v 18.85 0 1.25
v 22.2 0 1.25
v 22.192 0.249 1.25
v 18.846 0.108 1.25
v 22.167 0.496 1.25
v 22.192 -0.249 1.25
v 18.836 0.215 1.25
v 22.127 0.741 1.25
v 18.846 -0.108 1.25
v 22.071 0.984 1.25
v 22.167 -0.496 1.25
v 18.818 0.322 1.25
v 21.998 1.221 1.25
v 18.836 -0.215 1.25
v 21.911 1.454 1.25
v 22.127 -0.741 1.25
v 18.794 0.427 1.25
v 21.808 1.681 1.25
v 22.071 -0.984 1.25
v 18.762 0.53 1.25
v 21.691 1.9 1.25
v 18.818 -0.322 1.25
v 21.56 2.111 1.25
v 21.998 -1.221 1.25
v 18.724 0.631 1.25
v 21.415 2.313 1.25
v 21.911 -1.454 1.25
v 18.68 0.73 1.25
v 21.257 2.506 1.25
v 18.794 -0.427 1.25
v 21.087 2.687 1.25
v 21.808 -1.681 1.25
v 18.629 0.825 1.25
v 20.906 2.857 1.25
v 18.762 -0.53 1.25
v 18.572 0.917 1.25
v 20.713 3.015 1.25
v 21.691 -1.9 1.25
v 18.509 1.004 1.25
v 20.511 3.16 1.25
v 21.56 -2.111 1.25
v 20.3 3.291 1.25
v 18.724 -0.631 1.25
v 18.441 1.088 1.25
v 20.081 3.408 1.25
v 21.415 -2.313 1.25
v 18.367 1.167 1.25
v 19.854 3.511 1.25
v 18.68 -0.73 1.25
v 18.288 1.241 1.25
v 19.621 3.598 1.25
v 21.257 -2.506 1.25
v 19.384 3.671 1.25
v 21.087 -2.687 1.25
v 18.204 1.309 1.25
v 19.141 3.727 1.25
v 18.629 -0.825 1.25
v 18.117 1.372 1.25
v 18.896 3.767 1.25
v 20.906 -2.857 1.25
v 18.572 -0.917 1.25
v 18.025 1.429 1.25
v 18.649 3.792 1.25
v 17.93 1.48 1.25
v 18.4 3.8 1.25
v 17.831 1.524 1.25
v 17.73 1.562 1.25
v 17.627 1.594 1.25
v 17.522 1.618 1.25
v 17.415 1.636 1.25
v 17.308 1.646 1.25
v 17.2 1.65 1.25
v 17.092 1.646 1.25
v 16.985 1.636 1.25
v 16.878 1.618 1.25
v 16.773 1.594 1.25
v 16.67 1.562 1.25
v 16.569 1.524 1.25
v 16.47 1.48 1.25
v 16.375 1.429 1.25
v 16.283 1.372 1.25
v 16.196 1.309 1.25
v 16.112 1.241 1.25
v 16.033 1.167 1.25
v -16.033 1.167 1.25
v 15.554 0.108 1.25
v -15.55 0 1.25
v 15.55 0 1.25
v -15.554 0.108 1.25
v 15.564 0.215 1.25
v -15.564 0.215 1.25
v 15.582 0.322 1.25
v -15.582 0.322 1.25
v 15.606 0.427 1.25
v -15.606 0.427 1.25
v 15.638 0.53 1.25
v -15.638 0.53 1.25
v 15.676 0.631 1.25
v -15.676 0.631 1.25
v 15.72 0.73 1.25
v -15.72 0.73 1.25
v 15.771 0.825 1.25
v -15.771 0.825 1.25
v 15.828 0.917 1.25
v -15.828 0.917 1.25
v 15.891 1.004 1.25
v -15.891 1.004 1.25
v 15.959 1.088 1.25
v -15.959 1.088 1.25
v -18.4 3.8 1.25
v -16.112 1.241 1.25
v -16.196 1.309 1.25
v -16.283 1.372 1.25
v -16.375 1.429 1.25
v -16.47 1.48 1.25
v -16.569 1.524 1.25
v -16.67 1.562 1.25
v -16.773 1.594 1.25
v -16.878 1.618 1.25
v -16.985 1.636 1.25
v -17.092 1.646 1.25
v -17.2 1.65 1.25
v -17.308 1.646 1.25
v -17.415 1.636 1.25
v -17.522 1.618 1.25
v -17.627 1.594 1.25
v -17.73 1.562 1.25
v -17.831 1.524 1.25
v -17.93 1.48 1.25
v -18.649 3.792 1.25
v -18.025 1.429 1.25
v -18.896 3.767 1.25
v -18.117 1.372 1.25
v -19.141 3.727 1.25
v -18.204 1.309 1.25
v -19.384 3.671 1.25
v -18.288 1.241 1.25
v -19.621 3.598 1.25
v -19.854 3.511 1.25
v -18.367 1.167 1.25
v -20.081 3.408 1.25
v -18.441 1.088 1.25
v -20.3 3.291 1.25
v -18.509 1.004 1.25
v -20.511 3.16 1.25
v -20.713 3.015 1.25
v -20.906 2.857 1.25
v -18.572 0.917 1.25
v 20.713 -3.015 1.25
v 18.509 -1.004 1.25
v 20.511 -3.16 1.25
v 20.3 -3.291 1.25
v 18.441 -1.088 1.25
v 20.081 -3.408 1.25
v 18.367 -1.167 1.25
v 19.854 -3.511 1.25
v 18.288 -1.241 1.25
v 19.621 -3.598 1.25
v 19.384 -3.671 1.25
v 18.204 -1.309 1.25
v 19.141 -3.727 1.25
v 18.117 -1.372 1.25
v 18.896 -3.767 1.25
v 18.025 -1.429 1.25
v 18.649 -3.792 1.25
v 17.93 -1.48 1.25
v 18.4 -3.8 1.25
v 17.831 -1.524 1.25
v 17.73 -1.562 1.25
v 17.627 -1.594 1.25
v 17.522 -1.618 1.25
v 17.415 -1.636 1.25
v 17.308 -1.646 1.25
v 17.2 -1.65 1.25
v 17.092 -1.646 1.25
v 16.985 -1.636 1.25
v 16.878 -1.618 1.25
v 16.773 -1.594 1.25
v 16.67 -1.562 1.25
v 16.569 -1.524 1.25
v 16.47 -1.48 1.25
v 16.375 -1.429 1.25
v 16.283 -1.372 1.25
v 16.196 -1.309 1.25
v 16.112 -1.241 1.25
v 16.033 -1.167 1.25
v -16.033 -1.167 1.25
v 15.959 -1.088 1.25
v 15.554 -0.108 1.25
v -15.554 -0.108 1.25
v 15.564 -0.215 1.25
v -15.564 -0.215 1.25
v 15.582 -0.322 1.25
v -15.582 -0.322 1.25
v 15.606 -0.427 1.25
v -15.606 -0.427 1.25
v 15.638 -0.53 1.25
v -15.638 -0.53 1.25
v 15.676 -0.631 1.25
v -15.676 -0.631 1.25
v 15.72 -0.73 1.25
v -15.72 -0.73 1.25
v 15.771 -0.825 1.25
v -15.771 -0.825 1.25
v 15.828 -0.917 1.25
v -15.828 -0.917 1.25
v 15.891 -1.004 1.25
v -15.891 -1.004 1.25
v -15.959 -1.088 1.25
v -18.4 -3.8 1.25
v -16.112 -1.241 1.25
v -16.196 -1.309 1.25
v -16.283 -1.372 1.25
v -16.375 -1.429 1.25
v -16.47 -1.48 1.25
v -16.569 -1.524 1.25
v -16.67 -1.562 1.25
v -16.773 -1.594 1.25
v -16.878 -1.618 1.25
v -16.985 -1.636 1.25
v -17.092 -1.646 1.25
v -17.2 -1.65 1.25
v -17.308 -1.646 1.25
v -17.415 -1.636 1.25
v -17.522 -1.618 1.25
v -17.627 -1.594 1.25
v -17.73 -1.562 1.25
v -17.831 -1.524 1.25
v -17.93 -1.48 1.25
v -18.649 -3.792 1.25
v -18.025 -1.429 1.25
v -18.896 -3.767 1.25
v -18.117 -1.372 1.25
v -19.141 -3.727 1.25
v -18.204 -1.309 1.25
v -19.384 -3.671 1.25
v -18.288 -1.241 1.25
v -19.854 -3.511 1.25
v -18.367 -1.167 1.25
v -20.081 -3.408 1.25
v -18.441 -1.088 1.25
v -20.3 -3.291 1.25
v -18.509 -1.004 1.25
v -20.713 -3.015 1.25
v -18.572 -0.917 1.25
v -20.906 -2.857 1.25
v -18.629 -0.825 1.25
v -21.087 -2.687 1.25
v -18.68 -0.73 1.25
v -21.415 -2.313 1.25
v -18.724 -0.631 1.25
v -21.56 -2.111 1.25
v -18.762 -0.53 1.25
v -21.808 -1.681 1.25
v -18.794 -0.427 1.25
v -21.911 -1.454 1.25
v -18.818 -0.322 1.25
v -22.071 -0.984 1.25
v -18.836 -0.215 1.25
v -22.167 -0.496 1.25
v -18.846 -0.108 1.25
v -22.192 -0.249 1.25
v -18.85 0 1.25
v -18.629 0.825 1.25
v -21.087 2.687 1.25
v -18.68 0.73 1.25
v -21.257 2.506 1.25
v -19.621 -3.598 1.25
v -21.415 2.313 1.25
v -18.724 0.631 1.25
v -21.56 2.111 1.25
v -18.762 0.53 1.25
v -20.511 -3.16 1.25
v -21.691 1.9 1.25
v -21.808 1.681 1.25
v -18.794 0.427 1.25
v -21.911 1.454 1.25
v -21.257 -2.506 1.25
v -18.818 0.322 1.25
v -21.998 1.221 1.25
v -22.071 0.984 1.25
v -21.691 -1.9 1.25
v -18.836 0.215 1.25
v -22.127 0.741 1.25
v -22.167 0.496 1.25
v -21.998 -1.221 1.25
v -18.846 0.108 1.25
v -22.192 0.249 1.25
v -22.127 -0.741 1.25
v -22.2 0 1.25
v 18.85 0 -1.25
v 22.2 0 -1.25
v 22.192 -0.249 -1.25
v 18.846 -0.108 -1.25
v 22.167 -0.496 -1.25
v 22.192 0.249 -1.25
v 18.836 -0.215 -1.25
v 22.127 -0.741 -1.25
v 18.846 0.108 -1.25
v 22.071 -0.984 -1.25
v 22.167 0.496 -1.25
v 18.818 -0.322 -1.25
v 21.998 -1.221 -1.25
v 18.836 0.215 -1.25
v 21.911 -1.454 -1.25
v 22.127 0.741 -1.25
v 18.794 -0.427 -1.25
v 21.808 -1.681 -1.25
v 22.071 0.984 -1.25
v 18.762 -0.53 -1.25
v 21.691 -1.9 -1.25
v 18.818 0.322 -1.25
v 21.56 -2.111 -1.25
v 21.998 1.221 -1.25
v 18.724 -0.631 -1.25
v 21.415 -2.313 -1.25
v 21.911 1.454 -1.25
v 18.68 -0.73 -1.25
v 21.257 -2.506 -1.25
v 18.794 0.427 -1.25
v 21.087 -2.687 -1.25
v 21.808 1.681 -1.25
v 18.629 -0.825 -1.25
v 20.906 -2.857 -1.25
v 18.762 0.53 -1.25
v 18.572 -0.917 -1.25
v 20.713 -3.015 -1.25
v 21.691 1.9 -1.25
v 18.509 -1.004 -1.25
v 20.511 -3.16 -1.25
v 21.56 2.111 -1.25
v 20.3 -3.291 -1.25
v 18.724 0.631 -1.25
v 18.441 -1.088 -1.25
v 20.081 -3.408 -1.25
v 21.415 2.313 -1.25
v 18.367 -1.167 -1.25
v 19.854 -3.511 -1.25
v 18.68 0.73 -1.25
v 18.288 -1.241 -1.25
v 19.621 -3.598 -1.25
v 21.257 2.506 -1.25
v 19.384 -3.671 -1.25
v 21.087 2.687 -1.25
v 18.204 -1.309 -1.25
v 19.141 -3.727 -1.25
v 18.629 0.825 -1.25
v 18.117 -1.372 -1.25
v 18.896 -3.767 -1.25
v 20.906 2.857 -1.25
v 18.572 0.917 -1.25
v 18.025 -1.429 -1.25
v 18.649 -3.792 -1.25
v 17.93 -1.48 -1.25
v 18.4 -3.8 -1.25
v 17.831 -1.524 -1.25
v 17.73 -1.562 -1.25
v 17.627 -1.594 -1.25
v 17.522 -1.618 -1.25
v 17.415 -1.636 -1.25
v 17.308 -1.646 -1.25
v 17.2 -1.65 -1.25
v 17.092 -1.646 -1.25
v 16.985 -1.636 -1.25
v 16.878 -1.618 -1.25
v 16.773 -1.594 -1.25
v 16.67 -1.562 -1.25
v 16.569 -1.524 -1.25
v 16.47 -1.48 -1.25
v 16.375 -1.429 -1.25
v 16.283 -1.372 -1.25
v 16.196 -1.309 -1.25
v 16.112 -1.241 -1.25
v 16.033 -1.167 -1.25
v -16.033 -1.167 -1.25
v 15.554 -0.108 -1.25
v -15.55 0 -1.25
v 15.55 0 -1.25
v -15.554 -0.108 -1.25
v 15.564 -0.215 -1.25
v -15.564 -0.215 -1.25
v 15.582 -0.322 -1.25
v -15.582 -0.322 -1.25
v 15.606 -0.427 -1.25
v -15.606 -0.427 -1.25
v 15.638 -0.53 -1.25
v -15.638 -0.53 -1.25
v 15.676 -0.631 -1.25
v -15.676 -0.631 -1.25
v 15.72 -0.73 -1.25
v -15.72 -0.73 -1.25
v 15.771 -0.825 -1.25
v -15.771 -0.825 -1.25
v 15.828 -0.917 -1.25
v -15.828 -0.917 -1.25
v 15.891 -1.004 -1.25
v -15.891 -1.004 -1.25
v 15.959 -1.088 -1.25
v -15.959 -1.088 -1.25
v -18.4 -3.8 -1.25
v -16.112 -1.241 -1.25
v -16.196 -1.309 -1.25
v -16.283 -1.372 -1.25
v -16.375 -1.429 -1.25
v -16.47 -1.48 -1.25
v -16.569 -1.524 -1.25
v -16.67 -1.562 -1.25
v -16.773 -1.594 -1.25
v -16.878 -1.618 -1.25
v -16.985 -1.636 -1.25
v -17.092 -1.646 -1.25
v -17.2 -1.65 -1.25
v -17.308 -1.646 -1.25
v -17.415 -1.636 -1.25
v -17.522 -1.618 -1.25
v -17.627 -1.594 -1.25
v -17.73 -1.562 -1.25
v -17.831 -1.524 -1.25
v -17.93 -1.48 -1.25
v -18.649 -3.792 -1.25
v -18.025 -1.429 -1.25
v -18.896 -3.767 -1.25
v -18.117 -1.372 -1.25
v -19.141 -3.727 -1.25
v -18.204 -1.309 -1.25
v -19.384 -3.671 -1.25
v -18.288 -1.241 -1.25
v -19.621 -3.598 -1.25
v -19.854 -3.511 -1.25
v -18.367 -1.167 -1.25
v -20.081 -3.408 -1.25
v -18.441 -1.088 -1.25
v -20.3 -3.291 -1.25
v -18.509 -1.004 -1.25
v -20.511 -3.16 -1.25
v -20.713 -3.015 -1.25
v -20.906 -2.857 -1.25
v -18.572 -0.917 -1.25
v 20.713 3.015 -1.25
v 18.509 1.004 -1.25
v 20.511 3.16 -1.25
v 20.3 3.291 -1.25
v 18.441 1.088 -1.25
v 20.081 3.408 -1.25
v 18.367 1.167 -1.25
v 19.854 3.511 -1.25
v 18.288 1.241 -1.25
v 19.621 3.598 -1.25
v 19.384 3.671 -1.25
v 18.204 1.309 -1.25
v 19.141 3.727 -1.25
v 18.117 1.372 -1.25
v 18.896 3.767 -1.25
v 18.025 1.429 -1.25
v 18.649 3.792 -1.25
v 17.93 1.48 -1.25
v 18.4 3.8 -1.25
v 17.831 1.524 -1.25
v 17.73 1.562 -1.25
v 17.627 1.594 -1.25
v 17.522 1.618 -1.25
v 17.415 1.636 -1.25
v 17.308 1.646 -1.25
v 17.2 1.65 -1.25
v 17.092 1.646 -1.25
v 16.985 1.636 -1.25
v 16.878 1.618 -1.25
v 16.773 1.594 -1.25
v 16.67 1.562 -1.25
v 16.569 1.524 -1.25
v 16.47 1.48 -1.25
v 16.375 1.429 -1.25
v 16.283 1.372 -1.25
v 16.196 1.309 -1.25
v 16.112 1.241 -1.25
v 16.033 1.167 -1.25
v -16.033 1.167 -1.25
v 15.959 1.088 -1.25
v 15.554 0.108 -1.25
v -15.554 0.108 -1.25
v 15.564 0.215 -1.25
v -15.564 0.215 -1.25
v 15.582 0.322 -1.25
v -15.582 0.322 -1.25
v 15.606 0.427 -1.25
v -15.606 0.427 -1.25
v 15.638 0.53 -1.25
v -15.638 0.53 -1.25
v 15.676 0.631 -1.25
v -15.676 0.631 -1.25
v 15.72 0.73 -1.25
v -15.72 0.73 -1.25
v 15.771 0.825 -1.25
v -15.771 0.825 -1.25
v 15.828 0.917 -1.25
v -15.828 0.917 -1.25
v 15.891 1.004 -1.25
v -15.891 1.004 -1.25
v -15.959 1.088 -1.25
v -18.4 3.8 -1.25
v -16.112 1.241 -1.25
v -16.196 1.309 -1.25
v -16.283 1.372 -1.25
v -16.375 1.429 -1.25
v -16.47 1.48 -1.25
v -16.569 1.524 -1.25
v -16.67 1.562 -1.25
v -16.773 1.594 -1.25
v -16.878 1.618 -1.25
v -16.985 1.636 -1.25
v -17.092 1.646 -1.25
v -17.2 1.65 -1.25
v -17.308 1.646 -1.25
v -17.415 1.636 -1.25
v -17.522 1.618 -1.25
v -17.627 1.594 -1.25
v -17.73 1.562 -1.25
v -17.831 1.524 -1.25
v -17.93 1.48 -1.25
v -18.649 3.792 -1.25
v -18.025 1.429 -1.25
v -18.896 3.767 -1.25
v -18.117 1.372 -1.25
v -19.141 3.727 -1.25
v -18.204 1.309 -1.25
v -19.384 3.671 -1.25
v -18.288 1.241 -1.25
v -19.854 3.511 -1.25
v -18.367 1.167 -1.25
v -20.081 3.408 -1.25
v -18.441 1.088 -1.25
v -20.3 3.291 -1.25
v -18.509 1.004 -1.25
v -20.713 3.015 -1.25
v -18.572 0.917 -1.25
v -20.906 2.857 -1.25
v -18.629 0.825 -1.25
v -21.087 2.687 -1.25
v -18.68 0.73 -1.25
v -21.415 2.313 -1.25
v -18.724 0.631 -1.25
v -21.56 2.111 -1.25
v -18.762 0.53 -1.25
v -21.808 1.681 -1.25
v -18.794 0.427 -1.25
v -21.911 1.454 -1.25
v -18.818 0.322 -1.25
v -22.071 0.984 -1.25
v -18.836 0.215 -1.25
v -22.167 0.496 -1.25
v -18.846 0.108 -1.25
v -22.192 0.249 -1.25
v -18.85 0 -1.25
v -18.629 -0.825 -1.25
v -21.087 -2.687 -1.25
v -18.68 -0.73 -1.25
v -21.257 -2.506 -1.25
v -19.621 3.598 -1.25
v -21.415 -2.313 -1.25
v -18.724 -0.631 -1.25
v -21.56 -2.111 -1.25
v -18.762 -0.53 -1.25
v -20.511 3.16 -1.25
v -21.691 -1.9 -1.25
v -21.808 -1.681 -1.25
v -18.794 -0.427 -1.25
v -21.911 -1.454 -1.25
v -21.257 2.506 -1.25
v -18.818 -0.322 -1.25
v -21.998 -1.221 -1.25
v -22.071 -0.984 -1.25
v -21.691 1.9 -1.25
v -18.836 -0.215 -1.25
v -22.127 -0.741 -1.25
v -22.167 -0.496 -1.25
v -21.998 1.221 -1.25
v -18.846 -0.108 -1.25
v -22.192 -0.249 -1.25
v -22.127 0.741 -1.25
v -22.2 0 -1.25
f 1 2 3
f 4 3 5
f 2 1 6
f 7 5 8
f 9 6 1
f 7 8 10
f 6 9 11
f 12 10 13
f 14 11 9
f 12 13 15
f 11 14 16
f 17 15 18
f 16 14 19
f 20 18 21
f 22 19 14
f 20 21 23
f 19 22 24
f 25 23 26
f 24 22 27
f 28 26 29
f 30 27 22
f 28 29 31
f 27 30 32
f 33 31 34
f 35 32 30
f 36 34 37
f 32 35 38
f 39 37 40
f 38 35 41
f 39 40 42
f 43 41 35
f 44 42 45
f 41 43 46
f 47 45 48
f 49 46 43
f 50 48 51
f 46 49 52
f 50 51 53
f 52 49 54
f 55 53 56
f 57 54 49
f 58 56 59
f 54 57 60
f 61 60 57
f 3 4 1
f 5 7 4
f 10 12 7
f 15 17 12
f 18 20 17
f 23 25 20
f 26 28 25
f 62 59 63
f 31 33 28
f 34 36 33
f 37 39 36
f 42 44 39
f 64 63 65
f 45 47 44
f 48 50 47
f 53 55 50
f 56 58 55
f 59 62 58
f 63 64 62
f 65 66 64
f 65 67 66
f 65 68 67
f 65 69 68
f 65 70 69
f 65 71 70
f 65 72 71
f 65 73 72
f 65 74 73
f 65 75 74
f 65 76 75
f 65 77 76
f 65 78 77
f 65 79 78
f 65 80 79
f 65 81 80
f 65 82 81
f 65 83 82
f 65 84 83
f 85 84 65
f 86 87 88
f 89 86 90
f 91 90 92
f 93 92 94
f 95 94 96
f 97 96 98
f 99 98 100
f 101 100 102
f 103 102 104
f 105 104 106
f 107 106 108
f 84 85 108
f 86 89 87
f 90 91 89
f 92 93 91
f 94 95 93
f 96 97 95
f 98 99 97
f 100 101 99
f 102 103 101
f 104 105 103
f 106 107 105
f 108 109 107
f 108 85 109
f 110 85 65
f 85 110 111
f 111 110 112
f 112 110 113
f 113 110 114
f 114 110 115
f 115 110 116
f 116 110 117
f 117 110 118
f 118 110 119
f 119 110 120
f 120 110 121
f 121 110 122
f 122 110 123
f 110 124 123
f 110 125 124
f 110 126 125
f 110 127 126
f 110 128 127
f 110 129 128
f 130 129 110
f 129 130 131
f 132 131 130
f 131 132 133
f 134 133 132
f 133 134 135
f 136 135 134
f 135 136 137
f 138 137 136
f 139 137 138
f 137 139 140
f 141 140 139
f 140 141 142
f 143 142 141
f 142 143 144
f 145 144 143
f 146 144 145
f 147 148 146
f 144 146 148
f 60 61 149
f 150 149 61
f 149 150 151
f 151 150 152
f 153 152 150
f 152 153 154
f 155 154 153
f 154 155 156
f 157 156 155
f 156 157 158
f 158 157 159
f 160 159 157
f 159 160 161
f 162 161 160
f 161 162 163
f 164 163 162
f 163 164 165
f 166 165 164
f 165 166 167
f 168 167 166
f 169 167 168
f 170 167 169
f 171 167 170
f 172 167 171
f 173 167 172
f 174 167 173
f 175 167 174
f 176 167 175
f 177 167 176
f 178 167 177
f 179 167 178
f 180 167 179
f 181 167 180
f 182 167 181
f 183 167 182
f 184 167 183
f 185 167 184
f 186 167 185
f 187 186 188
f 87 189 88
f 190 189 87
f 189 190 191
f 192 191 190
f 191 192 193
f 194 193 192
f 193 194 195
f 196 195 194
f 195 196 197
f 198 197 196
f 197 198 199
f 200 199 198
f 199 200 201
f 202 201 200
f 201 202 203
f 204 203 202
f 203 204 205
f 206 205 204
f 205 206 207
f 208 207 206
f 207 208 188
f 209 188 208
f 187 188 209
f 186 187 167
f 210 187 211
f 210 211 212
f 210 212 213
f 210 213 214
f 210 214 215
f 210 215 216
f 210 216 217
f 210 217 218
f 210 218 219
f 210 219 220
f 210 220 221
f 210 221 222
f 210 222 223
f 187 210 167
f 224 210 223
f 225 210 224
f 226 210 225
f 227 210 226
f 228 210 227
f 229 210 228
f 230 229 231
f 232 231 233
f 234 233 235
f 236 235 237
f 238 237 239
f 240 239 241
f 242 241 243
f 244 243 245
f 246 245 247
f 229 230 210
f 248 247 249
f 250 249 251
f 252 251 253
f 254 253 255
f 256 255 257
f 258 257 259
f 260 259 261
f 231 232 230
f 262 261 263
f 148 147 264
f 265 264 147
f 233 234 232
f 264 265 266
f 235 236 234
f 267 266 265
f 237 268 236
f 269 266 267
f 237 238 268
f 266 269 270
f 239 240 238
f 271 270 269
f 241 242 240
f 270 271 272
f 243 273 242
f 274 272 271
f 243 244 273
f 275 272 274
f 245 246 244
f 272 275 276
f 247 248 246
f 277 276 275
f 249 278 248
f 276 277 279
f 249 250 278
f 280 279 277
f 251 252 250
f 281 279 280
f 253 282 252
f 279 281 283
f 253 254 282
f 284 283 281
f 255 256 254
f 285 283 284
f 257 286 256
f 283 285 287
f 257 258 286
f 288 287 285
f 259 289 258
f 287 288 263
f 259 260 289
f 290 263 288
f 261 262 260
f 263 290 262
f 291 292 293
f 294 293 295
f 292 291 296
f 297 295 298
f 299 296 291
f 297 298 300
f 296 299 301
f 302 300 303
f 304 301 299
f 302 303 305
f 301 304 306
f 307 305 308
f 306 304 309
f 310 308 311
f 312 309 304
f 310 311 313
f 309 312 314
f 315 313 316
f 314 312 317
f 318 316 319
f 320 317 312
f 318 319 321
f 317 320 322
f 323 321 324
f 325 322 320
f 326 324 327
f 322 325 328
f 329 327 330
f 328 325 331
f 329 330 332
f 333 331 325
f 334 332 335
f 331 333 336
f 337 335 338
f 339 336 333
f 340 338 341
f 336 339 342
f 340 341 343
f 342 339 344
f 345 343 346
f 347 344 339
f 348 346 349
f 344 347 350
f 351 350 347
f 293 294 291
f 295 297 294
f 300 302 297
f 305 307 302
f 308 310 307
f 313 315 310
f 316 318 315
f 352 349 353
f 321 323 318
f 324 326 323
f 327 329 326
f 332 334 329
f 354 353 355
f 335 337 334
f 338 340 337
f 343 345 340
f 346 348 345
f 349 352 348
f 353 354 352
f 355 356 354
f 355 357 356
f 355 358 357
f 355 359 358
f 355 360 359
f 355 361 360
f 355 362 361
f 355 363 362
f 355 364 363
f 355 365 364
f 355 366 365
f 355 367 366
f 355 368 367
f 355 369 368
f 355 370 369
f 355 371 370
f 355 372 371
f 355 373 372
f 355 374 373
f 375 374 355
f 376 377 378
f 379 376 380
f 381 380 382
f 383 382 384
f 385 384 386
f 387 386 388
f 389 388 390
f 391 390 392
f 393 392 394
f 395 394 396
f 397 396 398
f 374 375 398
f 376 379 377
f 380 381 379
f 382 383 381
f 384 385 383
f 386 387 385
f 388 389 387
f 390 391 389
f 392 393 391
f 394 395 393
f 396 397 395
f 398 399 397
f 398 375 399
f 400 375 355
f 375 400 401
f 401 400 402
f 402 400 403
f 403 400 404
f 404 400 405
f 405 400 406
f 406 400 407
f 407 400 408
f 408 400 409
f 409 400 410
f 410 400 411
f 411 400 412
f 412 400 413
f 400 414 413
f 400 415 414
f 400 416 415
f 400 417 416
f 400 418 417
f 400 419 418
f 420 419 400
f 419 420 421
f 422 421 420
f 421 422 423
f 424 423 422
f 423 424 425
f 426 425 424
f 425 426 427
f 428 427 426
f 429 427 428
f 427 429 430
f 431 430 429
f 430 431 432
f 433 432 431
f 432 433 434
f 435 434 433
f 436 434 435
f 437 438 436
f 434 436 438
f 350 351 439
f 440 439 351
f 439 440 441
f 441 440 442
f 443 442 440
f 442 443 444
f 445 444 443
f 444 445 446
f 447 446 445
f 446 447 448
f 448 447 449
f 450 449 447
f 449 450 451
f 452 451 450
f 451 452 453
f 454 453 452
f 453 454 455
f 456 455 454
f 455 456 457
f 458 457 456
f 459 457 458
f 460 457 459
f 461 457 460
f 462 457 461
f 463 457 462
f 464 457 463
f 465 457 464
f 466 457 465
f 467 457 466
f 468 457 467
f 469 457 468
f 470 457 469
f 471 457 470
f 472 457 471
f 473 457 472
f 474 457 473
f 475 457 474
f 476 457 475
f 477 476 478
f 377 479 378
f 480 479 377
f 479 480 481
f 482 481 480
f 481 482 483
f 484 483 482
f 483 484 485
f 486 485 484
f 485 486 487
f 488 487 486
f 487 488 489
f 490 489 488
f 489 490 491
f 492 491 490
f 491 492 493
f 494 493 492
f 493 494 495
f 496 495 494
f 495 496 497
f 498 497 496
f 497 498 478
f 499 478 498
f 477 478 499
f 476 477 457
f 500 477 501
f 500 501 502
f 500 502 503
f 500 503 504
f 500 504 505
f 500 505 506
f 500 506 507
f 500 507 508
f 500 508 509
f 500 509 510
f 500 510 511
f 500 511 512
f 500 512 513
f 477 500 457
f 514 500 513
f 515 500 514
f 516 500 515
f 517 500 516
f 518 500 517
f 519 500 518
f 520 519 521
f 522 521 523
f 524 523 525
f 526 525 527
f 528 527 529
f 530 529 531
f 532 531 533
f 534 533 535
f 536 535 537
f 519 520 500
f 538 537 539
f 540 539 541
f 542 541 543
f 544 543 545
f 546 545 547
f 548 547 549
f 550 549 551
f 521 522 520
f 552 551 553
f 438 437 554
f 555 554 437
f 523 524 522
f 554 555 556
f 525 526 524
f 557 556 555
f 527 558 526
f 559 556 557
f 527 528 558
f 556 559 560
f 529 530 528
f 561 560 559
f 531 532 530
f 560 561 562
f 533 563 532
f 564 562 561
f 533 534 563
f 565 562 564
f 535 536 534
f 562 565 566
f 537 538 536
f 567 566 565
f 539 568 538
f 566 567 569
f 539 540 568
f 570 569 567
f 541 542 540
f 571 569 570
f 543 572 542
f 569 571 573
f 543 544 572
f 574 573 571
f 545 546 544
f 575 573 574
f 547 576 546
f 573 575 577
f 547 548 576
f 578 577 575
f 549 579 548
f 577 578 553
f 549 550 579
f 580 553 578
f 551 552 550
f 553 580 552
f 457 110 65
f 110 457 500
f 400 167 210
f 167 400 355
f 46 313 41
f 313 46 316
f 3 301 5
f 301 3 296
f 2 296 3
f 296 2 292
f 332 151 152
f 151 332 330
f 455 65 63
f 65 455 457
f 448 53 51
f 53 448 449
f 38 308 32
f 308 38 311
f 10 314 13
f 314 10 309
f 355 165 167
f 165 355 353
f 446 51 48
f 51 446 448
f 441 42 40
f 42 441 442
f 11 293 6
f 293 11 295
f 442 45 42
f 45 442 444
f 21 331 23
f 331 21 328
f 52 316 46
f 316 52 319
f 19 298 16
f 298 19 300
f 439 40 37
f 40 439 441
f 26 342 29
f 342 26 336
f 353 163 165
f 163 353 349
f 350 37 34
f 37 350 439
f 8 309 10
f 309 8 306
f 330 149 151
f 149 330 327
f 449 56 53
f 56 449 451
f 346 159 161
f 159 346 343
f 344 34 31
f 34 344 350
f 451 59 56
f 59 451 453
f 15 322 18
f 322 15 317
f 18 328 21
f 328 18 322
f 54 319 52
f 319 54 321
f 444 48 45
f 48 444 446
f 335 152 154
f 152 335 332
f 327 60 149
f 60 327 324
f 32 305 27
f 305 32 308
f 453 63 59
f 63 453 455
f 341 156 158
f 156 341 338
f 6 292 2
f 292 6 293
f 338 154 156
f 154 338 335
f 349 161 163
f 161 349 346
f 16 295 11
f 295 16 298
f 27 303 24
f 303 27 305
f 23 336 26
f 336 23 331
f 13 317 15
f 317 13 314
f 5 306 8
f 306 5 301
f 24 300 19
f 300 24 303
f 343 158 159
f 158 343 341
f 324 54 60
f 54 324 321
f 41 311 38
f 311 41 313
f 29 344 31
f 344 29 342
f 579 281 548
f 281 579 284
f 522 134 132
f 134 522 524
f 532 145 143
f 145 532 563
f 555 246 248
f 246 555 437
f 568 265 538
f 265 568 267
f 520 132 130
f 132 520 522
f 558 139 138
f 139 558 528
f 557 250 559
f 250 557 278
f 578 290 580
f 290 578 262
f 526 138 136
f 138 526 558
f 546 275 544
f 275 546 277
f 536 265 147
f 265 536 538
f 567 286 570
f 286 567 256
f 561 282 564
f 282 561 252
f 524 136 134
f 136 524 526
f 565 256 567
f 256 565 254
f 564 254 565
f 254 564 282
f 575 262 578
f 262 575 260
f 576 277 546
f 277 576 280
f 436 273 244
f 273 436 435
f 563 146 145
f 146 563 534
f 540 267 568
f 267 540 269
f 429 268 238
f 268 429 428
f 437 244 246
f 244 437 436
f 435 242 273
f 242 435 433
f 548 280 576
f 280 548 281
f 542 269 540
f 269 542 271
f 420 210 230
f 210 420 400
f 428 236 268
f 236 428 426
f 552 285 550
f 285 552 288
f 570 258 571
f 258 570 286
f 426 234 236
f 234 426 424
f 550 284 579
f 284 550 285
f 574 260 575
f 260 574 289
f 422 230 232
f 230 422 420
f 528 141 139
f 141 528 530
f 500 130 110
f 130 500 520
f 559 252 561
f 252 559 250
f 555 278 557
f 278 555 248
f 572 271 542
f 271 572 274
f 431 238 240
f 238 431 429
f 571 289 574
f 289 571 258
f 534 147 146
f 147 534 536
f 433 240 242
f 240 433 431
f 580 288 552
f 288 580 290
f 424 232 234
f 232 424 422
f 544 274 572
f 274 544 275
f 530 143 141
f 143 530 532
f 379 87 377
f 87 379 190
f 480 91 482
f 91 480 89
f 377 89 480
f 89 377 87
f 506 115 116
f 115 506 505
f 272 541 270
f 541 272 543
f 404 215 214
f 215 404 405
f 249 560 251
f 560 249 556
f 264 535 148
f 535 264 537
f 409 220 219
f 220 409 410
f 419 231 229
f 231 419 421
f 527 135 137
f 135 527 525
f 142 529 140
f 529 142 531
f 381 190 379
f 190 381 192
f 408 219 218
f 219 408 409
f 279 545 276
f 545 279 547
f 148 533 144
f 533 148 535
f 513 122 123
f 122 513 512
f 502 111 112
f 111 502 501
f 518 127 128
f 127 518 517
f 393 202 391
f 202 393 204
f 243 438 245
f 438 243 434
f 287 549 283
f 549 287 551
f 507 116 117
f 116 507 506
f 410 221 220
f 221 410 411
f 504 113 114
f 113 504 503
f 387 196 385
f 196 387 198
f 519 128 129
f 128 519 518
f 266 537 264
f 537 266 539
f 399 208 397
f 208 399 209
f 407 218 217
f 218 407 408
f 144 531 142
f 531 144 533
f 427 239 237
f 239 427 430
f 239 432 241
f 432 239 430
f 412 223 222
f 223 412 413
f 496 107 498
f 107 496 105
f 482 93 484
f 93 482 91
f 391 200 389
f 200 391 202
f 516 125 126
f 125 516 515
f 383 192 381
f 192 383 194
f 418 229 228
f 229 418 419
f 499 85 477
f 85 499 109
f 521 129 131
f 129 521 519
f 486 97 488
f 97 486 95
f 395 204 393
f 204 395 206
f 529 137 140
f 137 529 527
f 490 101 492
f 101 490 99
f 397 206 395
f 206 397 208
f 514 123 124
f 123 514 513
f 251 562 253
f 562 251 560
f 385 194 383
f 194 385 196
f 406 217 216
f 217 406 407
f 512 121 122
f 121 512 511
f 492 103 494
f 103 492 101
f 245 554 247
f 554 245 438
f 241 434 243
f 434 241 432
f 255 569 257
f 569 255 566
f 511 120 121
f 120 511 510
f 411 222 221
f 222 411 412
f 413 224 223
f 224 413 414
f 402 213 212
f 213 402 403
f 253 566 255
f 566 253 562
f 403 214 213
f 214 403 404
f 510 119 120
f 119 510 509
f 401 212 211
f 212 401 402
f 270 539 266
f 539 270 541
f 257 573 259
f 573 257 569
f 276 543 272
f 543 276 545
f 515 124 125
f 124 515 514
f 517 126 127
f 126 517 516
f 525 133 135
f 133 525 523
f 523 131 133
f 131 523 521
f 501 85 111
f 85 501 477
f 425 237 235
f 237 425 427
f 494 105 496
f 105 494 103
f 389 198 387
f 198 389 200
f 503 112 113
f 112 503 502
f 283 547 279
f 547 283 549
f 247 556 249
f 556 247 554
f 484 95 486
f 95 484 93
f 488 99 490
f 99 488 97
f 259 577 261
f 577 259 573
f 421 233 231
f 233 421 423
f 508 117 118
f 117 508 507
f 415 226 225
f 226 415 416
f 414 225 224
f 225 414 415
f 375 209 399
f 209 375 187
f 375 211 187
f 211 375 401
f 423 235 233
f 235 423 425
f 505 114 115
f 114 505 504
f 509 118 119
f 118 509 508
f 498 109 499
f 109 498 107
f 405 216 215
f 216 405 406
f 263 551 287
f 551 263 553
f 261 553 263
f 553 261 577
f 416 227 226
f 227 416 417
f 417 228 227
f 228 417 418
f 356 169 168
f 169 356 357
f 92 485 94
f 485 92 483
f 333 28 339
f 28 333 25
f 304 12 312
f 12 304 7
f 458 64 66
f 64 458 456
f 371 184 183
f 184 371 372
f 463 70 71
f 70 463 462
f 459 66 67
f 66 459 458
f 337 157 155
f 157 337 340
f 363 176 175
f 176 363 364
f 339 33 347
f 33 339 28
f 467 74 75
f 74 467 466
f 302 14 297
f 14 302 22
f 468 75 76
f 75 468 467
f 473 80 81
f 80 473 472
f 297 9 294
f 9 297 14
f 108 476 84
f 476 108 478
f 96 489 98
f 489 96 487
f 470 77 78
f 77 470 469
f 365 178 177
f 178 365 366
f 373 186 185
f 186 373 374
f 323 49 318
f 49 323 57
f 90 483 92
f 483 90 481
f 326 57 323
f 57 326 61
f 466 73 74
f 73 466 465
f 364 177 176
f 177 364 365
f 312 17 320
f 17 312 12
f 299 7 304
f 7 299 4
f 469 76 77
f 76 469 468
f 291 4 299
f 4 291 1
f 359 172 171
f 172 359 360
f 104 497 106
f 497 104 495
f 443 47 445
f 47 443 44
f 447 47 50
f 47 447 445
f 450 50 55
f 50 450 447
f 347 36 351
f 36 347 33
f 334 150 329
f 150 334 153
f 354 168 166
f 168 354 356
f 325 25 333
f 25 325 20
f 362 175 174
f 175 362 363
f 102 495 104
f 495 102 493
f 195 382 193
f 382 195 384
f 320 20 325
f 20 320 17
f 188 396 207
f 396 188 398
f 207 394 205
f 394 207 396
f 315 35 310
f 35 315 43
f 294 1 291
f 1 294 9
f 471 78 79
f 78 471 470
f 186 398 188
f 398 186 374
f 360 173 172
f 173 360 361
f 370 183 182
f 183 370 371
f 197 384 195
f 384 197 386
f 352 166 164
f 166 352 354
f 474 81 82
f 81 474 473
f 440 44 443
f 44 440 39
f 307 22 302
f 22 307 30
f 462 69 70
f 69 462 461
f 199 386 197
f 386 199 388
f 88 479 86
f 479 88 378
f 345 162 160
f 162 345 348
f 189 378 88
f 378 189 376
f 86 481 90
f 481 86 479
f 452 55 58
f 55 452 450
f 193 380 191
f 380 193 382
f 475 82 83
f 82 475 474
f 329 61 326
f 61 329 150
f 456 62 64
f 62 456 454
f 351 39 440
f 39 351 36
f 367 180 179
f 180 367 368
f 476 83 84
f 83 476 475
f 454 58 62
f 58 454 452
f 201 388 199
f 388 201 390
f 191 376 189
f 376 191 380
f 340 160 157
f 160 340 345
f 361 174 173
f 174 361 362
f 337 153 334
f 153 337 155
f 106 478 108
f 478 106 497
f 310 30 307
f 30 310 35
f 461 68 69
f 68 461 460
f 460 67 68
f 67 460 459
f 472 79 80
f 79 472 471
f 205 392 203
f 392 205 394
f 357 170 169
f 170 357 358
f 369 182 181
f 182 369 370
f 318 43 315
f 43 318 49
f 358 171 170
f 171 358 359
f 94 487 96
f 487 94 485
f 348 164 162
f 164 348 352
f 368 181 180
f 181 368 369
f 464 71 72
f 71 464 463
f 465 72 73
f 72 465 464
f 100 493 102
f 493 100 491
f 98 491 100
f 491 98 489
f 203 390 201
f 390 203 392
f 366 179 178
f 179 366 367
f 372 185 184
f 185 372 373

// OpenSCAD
// Flat link/strap plate with rounded (capsule) ends and two through-holes
// Bounding box target: 44.4 x 7.6 x 2.5 mm

$fn = 96;

// Parameters (mm)
L = 44.4;
W = 7.6;
T = 2.5;

hole_D = 3.2;
hole_offset_from_end = 5;   // hole center distance from each end along length
hole_clearance = 0.05;

overlap = 0.8;              // used only to ensure clean boolean cuts

// Derived
end_R = W/2;                // capsule ends match width
rect_L = L - 2*end_R;       // center rectangle length (tangent-to-tangent)

// Capsule body (one connected solid)
module strap_body() {
    union() {
        cube([rect_L, W, T], center=true);
        translate([ rect_L/2, 0, 0]) cylinder(r=end_R, h=T, center=true);
        translate([-rect_L/2, 0, 0]) cylinder(r=end_R, h=T, center=true);
    }
}

// Through-holes (aligned on long axis)
module strap_holes() {
    for (sx = [-1, 1]) {
        translate([sx*(L/2 - hole_offset_from_end), 0, 0])
            cylinder(r=hole_D/2 + hole_clearance, h=T + 2*overlap, center=true);
    }
}

// Final model
color("Silver")
difference() {
    strap_body();
    strap_holes();
}
